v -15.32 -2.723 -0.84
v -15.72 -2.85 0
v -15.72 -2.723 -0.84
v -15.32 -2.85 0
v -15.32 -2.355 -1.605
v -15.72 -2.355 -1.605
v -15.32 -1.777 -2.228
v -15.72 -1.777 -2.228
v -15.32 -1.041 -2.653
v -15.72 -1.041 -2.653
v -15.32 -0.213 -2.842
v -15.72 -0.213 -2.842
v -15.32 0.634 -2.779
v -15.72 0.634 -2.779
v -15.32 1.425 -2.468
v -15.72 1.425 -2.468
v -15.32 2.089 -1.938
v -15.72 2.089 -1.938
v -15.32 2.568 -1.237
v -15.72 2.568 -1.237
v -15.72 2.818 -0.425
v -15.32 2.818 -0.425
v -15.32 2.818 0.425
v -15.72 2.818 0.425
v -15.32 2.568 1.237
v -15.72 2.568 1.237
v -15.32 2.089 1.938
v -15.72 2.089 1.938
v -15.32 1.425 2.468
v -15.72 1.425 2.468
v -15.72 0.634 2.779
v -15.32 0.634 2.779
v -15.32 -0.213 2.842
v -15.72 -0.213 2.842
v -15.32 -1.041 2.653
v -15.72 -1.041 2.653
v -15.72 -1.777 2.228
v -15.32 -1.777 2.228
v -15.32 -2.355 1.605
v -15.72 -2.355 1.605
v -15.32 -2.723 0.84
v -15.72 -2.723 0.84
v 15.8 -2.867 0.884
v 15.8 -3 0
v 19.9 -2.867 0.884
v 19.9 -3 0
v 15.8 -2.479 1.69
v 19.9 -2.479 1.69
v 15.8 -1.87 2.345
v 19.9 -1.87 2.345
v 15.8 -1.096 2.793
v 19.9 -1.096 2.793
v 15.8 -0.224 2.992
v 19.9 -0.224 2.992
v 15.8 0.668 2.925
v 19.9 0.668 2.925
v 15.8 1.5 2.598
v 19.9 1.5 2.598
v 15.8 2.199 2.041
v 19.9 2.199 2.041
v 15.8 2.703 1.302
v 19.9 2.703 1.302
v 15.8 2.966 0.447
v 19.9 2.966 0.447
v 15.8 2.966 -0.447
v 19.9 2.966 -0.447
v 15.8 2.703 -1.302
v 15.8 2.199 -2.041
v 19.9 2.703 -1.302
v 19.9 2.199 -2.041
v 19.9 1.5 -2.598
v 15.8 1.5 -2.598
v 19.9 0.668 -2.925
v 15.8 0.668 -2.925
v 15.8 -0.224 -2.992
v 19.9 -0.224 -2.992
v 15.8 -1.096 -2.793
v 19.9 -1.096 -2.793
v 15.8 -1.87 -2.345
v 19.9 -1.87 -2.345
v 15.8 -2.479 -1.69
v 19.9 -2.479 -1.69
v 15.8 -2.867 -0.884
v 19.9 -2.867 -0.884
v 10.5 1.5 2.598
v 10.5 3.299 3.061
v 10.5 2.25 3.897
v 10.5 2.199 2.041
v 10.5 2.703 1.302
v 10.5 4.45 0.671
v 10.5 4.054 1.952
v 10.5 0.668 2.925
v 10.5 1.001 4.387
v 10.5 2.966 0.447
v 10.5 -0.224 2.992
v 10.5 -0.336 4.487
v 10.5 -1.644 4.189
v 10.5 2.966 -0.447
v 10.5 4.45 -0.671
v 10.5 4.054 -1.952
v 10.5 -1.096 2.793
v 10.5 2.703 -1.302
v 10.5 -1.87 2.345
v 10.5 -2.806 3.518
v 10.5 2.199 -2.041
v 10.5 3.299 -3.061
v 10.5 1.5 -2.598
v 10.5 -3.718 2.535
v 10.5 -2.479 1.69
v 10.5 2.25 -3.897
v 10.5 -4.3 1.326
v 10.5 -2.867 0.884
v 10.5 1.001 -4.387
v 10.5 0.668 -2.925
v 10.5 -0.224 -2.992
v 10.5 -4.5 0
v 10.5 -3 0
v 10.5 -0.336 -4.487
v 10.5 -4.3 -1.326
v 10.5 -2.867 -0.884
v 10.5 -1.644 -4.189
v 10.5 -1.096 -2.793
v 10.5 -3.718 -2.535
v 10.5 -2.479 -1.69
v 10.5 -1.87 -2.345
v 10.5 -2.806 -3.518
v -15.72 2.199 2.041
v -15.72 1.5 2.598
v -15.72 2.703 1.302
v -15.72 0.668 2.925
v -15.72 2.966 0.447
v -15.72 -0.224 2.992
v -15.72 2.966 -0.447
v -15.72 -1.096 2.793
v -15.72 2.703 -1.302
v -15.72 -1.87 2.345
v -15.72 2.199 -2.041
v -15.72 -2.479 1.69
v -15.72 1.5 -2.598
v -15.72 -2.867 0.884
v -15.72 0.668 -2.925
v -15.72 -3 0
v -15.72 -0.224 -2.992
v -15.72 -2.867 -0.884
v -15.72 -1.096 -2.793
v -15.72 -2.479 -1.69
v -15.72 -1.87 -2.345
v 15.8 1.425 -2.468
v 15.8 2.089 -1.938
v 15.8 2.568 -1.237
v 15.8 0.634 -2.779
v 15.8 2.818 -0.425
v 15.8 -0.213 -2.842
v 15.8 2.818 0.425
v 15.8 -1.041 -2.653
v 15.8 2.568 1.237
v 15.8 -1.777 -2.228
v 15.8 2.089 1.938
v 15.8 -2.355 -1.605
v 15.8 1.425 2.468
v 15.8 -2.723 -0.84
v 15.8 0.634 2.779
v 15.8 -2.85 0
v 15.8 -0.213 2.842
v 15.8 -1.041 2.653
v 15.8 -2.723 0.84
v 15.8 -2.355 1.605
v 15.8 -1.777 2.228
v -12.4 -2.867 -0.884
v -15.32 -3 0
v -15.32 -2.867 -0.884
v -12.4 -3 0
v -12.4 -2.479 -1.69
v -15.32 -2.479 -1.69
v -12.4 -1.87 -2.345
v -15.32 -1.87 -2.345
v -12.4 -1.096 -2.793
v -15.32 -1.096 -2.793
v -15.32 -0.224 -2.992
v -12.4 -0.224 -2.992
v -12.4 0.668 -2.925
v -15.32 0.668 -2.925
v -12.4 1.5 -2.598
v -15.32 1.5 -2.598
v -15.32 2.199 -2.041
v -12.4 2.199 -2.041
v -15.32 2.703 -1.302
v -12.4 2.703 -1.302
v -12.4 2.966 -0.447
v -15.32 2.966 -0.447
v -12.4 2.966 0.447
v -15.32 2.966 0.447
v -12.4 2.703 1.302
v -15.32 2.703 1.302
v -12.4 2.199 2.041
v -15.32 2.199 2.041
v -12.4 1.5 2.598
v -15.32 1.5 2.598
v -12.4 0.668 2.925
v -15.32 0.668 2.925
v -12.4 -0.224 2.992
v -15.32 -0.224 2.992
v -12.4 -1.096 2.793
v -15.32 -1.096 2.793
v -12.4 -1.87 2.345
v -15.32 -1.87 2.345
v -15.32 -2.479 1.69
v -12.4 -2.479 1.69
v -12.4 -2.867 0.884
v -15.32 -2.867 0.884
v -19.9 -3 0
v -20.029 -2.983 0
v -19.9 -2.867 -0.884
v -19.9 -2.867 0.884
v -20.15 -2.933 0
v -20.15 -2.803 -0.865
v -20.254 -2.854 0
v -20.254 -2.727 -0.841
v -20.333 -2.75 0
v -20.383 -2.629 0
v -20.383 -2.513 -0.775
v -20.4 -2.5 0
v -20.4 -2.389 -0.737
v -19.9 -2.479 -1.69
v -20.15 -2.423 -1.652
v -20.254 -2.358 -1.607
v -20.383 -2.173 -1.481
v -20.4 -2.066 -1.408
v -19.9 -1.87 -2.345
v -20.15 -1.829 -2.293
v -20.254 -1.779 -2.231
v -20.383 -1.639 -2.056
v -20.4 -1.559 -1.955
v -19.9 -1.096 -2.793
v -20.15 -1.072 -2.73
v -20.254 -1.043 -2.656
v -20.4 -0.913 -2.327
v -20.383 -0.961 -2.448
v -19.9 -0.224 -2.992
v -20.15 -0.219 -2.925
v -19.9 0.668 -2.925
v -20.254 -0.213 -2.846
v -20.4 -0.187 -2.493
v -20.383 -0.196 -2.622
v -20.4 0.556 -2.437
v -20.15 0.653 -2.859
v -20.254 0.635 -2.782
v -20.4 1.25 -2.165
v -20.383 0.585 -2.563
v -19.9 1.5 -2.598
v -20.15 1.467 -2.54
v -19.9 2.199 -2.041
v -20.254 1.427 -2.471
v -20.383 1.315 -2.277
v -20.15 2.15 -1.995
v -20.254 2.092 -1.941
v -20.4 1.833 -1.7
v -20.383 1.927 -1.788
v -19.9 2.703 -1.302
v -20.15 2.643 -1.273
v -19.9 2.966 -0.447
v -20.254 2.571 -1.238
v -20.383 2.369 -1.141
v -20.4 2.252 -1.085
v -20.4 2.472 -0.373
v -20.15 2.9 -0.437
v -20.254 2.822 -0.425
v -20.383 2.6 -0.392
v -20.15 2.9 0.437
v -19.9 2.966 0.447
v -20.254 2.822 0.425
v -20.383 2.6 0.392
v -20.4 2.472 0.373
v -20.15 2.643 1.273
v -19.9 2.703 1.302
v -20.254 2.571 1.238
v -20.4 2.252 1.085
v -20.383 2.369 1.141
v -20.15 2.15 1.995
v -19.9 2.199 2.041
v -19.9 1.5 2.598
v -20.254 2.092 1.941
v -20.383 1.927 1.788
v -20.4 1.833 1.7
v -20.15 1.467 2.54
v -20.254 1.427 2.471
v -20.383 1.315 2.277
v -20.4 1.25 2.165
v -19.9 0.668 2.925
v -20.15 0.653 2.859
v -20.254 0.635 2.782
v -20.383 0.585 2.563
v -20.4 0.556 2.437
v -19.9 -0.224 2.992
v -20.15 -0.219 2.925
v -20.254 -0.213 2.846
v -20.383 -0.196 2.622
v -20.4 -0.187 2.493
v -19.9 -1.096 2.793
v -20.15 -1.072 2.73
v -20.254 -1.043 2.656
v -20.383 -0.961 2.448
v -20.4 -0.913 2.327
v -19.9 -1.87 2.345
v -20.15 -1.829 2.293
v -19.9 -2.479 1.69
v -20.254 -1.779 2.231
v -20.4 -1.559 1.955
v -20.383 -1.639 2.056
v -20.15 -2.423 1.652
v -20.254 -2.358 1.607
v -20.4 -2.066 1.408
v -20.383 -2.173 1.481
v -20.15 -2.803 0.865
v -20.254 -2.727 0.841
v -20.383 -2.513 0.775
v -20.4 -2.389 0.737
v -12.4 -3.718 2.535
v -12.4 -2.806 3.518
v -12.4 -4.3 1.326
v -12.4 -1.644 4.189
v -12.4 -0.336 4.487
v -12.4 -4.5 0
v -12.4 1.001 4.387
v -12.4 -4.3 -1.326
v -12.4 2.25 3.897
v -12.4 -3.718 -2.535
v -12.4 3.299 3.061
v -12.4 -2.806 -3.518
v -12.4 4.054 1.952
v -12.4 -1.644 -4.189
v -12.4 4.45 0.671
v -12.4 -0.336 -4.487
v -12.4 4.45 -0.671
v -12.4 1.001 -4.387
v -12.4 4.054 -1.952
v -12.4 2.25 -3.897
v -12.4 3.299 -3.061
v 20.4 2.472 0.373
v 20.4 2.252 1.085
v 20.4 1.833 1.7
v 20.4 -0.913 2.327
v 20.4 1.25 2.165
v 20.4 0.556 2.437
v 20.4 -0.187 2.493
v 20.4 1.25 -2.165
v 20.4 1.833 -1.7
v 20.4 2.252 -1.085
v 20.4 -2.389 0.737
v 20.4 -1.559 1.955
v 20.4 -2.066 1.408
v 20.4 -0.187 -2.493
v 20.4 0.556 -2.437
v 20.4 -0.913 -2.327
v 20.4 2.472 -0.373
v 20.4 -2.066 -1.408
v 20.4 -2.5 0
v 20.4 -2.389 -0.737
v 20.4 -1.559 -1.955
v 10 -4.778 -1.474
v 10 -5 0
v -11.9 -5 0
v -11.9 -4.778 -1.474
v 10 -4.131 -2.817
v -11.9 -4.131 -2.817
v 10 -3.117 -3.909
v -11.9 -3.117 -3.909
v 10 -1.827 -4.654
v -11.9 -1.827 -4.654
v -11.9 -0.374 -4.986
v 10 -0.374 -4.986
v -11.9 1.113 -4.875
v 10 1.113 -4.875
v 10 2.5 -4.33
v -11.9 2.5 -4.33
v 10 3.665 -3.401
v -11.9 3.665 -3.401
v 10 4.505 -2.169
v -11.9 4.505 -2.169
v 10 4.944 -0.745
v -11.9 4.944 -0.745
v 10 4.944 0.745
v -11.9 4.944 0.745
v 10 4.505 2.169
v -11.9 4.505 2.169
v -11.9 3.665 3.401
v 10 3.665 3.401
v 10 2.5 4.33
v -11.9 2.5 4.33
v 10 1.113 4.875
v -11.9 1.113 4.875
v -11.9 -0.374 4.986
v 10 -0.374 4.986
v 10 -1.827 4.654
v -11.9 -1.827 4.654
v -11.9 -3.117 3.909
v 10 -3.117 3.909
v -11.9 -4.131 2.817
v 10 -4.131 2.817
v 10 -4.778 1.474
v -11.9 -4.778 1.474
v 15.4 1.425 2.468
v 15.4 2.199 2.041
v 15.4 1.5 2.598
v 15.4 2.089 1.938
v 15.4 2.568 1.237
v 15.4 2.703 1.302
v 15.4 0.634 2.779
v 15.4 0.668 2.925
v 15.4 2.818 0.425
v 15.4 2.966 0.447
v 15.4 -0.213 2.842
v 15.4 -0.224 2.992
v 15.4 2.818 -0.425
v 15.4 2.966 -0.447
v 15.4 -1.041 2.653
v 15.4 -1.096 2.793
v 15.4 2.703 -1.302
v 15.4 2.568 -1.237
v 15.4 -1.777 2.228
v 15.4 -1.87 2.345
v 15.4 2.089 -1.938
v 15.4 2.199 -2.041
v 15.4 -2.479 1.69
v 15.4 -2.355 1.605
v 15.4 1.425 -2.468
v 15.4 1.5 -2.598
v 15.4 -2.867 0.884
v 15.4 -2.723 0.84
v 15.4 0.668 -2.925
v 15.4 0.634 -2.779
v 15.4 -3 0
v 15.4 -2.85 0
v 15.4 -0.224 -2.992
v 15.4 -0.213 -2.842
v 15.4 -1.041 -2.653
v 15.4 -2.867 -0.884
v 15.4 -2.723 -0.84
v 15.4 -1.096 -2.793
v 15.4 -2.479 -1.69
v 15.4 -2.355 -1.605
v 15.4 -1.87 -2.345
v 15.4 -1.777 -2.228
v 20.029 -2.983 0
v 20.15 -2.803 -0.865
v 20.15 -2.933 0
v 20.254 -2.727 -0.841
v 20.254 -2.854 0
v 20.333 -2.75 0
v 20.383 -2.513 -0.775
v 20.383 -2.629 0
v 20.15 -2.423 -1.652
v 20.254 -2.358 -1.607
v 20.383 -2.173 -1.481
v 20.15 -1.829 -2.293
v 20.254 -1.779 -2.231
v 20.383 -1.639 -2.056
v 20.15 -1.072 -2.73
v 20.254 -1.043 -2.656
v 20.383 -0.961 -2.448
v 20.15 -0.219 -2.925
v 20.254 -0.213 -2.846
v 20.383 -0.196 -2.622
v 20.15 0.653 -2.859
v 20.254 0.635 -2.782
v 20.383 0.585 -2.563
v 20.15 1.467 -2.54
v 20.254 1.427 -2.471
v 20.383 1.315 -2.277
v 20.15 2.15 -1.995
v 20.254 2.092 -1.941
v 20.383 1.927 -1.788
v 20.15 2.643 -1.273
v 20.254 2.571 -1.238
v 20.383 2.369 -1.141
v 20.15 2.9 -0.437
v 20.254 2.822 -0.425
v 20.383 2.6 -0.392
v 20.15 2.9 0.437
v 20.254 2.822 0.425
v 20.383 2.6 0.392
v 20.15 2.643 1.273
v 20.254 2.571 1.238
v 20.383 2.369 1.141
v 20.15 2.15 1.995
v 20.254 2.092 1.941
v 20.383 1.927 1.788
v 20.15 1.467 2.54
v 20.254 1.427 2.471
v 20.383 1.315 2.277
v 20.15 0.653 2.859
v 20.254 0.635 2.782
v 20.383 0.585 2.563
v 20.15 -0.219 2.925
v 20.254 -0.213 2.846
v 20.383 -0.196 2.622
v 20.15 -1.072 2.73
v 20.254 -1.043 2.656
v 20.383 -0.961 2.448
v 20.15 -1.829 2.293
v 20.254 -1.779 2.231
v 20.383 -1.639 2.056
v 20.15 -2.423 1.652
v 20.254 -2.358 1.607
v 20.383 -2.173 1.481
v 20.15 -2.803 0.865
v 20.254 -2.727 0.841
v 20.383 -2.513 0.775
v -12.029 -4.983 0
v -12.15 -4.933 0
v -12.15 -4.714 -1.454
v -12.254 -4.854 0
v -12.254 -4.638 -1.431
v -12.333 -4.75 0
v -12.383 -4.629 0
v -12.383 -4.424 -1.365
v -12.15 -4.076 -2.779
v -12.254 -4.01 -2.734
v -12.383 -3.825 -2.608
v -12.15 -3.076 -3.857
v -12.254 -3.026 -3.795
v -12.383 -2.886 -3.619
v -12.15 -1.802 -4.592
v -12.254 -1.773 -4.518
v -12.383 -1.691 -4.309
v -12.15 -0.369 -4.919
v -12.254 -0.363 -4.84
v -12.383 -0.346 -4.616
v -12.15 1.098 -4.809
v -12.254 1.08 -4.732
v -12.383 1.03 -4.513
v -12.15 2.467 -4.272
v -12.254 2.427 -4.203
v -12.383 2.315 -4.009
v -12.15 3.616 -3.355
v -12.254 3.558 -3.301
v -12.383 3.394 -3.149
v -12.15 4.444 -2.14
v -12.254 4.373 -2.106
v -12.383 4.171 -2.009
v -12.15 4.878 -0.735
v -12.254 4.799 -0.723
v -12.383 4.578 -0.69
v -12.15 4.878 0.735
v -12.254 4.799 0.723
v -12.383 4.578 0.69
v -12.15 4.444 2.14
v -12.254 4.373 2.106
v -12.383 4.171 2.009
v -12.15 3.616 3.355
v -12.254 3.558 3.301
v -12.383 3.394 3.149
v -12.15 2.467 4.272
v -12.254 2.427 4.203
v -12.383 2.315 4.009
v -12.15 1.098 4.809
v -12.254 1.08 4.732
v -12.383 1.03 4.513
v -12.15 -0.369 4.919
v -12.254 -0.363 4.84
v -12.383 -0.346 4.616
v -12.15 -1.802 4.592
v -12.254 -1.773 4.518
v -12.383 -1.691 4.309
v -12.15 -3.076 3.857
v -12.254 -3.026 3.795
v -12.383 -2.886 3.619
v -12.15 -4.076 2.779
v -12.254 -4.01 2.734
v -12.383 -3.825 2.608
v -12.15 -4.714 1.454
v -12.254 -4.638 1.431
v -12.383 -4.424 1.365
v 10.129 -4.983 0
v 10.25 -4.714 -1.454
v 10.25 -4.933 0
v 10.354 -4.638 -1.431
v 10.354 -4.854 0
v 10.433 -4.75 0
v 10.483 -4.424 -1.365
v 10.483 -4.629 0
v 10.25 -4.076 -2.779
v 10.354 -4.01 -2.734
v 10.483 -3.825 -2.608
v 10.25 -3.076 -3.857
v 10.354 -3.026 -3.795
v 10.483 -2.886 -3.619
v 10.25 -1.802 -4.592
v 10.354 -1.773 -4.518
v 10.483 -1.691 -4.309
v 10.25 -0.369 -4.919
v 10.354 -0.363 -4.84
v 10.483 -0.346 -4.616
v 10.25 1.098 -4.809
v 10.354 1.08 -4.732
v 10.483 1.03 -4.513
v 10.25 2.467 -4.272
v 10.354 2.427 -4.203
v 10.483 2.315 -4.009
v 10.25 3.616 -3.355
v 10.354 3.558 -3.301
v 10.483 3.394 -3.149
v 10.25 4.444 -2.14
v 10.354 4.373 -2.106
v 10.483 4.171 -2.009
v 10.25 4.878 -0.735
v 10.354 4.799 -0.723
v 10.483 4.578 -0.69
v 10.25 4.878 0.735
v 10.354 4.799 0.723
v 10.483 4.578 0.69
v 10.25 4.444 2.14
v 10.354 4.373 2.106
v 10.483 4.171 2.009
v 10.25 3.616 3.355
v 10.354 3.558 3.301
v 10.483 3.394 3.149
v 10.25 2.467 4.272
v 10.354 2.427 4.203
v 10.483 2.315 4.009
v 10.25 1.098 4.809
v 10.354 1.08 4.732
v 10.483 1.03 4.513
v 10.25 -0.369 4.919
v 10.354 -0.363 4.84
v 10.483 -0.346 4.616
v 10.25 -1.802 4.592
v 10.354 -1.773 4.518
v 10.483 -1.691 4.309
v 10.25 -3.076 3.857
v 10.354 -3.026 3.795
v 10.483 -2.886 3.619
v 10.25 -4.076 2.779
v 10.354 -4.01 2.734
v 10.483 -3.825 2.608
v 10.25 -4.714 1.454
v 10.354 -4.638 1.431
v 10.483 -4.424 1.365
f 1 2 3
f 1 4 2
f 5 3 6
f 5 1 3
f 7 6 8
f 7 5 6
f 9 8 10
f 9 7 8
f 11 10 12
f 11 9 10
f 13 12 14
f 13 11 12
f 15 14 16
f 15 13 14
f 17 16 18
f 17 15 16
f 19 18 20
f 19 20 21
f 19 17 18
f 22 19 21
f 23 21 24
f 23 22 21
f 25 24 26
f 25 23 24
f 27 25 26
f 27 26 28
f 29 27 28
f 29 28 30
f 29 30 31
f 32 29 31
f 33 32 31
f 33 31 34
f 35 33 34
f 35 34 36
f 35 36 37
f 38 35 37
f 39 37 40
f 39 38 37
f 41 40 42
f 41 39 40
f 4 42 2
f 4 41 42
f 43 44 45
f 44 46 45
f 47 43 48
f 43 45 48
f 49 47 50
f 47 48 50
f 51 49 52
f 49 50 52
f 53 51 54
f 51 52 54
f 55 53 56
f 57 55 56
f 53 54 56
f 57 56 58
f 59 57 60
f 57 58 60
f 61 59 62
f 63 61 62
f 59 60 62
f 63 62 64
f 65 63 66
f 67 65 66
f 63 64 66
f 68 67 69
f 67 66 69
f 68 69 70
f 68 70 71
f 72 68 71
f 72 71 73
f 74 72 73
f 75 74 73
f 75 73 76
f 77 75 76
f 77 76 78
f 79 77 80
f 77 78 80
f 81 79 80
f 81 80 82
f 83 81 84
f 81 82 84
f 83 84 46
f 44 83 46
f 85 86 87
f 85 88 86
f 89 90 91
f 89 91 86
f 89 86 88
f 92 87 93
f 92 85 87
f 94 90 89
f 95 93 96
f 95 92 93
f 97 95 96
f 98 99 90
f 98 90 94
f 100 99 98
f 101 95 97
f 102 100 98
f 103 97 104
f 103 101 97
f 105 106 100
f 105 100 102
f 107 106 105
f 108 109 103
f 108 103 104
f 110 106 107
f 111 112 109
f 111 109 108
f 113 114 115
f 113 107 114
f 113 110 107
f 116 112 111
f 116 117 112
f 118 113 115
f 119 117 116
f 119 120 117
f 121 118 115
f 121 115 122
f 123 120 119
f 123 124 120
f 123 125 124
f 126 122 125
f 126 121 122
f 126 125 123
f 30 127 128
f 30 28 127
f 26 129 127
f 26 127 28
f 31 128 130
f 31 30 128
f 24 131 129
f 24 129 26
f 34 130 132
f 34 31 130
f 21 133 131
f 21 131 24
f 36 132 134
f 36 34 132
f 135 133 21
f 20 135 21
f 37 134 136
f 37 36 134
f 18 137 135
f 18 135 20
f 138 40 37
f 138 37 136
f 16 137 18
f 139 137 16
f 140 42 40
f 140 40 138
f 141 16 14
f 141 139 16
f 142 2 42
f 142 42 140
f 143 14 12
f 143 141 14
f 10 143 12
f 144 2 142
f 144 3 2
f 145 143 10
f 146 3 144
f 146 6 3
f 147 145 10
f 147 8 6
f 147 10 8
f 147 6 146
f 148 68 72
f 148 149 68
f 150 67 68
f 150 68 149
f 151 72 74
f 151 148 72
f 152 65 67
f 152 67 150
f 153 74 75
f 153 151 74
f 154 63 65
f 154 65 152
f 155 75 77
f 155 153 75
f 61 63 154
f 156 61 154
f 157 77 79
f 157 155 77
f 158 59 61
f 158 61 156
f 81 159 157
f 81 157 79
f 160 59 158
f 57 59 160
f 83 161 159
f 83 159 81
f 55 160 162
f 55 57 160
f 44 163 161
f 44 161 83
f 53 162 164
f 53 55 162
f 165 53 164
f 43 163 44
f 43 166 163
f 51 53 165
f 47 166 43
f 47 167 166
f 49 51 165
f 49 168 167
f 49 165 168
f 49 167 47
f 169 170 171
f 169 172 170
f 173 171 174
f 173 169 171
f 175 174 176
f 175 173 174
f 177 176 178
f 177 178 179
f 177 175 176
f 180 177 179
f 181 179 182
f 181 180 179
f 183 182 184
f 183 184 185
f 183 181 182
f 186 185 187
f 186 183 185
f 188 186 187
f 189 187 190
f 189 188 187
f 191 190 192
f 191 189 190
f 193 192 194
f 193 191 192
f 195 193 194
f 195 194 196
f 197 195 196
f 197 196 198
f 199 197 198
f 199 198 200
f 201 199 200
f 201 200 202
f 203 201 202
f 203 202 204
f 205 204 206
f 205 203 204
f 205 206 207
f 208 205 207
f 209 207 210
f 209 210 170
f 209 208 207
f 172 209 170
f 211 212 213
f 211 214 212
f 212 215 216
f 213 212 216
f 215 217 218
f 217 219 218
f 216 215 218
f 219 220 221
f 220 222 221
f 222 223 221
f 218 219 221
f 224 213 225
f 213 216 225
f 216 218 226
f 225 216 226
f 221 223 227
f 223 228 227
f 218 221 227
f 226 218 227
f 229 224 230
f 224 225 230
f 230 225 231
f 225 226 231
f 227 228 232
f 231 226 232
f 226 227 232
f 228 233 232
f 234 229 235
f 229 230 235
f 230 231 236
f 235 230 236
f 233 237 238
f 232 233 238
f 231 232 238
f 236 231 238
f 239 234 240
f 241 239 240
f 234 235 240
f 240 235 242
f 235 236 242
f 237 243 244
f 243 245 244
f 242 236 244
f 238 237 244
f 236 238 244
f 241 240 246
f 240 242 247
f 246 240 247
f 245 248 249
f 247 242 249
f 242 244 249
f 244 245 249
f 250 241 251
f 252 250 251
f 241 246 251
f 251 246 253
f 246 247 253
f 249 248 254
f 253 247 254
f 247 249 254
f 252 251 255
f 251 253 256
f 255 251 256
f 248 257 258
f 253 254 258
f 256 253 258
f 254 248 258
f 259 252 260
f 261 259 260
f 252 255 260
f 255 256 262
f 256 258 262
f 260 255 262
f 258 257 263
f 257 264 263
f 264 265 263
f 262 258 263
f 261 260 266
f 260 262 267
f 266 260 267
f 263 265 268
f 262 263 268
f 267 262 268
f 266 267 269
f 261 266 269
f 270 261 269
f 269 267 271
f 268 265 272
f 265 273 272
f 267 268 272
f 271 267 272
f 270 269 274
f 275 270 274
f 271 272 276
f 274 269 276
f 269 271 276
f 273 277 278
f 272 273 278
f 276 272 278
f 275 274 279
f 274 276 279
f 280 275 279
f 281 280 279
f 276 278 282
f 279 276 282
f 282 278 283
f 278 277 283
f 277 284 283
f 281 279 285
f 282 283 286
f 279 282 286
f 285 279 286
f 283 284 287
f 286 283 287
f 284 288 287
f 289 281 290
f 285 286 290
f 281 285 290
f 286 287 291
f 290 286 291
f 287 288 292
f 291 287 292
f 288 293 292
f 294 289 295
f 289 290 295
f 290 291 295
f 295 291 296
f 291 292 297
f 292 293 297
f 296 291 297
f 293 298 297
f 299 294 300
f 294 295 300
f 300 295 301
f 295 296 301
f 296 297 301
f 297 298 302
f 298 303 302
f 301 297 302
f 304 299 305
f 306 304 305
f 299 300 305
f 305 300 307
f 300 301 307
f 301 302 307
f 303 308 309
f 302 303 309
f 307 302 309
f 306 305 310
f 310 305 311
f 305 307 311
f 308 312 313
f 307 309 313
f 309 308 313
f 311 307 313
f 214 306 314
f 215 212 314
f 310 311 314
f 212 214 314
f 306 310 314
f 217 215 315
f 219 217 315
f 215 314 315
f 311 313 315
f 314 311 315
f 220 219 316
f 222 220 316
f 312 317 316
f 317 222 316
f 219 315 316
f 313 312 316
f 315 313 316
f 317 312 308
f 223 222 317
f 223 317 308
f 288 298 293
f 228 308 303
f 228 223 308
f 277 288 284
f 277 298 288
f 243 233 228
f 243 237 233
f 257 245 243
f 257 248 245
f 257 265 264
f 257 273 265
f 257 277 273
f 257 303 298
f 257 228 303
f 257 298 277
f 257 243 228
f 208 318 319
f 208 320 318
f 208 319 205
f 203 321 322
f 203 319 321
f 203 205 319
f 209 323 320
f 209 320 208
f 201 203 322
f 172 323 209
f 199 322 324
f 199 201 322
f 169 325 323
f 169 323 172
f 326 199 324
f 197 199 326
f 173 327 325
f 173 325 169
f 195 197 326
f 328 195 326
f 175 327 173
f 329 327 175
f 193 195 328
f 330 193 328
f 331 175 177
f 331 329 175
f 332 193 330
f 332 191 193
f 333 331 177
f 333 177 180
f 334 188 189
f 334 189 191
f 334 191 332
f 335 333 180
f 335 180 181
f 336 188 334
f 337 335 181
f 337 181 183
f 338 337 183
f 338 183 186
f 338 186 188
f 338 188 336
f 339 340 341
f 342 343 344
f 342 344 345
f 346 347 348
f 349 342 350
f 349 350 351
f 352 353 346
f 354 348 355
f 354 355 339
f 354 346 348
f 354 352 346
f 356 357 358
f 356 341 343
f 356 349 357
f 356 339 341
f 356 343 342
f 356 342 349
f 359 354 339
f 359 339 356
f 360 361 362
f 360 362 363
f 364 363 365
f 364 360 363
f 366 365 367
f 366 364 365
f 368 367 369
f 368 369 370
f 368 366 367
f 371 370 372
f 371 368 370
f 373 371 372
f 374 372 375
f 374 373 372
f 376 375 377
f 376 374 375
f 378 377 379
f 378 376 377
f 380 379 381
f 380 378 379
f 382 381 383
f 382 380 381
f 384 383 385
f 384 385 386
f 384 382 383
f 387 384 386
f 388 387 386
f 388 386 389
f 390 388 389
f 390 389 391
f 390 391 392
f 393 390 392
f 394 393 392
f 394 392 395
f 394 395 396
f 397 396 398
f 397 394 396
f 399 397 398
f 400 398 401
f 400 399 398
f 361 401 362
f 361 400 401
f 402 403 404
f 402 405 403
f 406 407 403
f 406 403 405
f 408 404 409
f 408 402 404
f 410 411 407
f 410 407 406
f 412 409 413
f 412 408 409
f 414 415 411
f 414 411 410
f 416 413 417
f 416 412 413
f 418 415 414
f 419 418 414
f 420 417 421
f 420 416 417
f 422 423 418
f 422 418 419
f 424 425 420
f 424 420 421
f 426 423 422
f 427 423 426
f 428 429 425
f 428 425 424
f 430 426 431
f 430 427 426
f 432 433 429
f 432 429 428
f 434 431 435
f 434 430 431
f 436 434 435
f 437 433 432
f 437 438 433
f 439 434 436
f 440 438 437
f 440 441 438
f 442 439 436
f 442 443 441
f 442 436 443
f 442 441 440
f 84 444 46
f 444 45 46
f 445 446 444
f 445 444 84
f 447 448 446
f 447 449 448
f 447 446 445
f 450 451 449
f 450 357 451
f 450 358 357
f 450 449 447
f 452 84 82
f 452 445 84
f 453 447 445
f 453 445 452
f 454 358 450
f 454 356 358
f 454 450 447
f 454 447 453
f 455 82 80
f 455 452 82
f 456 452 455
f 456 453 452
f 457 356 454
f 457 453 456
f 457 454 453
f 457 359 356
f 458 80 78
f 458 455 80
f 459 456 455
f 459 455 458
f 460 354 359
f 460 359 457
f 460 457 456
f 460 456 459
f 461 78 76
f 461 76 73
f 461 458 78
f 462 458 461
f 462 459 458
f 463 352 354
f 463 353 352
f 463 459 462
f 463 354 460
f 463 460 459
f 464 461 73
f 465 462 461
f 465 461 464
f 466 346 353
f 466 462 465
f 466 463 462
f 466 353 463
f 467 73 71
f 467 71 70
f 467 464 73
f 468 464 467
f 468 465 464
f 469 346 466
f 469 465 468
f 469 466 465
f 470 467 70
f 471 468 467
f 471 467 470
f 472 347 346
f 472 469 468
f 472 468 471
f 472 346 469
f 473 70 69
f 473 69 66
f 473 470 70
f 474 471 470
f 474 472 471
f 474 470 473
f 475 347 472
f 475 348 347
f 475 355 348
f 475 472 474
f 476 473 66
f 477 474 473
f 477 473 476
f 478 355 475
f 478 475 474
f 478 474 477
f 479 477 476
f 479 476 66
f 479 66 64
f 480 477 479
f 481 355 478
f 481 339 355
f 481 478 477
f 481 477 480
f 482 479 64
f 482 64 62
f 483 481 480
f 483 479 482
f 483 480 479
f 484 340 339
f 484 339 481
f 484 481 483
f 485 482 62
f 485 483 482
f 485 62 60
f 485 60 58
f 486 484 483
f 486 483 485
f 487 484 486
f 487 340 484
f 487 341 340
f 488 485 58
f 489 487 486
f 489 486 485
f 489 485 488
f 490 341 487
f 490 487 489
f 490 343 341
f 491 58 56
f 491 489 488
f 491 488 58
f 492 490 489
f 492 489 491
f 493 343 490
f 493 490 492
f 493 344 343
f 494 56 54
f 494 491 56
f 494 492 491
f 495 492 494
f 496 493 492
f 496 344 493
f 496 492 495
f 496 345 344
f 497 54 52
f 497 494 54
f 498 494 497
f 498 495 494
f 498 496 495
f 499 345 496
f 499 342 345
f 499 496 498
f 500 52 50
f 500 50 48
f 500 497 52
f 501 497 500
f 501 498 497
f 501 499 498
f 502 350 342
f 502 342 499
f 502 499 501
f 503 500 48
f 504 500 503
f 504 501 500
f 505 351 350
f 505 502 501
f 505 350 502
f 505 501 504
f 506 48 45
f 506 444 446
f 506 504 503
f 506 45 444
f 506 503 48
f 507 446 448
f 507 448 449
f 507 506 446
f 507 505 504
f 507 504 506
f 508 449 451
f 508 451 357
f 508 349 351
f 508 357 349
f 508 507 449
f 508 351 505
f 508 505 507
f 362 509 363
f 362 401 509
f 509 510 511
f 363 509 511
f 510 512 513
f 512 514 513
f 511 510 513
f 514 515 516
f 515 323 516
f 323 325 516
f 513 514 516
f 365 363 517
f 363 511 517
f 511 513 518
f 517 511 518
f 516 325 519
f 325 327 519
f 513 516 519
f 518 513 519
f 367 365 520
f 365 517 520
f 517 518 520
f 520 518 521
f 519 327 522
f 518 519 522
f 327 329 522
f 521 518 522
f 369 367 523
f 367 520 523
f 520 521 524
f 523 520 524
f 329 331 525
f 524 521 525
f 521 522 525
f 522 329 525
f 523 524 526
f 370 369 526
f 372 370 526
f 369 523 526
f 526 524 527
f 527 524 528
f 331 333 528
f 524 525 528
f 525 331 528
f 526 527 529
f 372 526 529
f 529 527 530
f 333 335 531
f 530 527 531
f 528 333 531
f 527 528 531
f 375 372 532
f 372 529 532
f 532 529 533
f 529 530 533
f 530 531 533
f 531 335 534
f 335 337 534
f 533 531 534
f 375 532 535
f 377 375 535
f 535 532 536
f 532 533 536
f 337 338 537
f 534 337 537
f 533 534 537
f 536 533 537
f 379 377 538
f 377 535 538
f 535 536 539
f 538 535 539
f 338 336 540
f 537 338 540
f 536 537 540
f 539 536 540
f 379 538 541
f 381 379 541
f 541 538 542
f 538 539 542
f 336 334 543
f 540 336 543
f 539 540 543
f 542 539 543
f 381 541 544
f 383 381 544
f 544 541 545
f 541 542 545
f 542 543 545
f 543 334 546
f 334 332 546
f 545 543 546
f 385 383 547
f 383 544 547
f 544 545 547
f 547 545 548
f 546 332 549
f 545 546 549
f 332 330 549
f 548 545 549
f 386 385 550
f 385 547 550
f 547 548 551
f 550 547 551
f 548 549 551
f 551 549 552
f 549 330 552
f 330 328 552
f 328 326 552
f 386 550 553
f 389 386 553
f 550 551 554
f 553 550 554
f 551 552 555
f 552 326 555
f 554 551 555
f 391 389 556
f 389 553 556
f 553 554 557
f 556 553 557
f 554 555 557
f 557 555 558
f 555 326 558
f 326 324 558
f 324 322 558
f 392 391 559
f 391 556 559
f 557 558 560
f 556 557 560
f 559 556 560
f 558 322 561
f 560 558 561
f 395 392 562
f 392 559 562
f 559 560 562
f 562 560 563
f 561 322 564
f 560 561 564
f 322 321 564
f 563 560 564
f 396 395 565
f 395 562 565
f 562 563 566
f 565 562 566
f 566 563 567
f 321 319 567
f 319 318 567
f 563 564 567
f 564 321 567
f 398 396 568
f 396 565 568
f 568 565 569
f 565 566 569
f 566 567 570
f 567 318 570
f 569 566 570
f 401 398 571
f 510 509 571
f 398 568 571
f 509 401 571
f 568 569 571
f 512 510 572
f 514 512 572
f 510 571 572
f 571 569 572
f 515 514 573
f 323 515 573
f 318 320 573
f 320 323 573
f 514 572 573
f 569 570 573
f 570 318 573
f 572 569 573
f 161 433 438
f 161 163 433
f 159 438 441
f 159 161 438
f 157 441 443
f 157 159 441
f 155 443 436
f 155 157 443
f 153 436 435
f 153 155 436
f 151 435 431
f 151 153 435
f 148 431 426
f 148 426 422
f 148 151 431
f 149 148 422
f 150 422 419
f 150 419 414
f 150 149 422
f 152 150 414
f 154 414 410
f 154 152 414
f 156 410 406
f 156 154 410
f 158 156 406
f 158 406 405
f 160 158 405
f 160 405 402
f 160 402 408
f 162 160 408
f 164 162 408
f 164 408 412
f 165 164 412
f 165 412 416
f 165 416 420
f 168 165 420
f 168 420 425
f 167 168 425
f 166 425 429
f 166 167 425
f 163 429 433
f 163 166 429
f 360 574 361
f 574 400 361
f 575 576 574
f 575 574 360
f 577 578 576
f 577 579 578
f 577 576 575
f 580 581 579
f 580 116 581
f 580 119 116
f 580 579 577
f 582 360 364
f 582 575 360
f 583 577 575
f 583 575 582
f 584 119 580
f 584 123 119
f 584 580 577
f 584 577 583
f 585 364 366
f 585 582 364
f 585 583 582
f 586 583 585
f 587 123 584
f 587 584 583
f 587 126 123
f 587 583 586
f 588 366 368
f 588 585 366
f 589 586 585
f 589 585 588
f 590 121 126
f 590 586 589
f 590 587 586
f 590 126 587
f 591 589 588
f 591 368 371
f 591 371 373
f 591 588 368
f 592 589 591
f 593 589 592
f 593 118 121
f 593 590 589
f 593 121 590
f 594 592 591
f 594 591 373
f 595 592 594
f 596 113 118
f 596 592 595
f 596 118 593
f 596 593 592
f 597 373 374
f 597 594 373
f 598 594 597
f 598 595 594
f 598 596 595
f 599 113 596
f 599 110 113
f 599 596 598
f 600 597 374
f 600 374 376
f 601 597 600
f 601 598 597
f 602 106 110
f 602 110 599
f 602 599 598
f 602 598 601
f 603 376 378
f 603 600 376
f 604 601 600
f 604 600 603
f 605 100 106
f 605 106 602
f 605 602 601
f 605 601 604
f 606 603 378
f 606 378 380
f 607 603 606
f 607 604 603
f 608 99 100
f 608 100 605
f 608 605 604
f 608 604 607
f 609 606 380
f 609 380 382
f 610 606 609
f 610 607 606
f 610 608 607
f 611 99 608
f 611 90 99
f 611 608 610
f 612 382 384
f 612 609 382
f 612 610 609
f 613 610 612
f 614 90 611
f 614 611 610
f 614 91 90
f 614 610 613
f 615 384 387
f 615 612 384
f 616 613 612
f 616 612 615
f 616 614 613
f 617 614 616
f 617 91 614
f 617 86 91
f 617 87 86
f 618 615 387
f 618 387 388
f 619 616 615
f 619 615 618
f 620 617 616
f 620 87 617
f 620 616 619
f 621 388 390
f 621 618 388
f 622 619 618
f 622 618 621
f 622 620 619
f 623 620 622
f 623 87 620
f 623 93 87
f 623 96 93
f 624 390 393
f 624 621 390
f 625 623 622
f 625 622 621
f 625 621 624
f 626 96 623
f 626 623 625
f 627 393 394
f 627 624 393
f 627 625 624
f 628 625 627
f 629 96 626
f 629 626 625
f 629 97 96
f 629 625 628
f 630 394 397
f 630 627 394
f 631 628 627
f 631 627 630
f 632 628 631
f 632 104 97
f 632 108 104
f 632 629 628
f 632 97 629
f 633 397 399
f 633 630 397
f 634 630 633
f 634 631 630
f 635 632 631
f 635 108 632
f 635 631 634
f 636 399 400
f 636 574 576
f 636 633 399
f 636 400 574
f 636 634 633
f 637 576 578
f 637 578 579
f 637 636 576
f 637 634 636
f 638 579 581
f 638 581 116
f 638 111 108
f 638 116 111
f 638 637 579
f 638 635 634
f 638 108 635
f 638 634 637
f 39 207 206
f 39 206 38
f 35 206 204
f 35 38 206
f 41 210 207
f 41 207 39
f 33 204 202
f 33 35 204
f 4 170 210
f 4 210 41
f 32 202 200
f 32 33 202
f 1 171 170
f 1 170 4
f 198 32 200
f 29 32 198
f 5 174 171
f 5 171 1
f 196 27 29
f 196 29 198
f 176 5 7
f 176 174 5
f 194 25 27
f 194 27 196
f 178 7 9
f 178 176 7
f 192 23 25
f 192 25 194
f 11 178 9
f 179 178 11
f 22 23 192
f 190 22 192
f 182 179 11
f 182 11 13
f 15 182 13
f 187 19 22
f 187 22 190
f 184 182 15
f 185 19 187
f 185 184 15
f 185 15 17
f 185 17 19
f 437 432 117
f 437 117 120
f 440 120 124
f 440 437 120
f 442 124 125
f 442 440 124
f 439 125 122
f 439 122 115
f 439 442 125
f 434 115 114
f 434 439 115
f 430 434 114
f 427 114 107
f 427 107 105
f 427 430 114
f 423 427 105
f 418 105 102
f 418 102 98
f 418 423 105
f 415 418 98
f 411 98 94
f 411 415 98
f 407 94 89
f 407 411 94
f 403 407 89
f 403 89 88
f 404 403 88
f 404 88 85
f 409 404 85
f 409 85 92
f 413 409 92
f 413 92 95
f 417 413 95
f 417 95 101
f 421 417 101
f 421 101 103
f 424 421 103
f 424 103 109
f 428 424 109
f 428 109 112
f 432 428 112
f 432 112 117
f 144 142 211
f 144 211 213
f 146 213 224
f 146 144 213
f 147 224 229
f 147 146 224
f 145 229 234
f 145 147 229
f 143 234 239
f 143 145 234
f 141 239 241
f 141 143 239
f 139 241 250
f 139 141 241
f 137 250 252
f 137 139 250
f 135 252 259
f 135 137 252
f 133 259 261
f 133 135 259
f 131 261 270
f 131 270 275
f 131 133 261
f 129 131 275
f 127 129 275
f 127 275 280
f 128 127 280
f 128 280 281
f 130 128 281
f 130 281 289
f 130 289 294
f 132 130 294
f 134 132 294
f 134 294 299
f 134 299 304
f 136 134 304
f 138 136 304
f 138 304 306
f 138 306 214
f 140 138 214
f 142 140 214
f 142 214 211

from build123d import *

# Parameters (mm, degrees)
SKETCH2_R           = 5
SKETCH2_R_2         = 3
CUT_EXTRUDE2_DEPTH  = 1.9
FILLET1_R           = 0.5
BOSS_EXTRUDE2_START = 0.1
SKETCH4_R           = 3
SKETCH4_R_2         = 2.85
BOSS_EXTRUDE2_DEPTH = 0.1
SKETCH6_R           = 3
SKETCH6_R_2         = 2.85
BOSS_EXTRUDE3_DEPTH = 0.02
BOSS_EXTRUDE4_START = 0.08
SKETCH7_R           = 3
SKETCH7_R_2         = 2.85
BOSS_EXTRUDE4_DEPTH = 0.08


with BuildPart() as part:
    # Sketch1 → Revolve1 (revolve)
    with BuildSketch(Plane.XY, mode=Mode.PRIVATE) as revolve1_sk:
        Polygon((-12.4, 5), (12.4, 5), (12.4, 3), (15.32, 3), (15.32, 2.85), (15.82, 2.85), (15.82, 3), (20.4, 3), (20.4, 0), (-20.4, 0), (-20.4, 3), (-15.82, 3), (-15.82, 2.85), (-15.32, 2.85), (-15.32, 3), (-12.4, 3), align=None)
    revolve(revolve1_sk.sketch.rotate(Axis((-20.4, 0, 0), (1, 0, 0)), 180), axis=Axis((-20.4, 0, 0), (1, 0, 0)))

    # Sketch2 → Cut-Extrude2 (cut)
    with BuildSketch(Plane(origin=(12.4, 0, 0), x_dir=(0, 0, -1), z_dir=(1, 0, 0))):
        with Locations(Location((0, 0, 0), (0, 0, 270))):
            Circle(SKETCH2_R)
        with Locations(Location((0, 0, 0), (0, 0, 270))):
            Circle(SKETCH2_R_2, mode=Mode.SUBTRACT)
    extrude(amount=-CUT_EXTRUDE2_DEPTH, mode=Mode.SUBTRACT)

    # Fillet1
    fillet1_edges = [part.edges().sort_by_distance(p)[0] for p in [
        (20.4, 3, 0),
        (-20.4, 3, 0),
        (-12.4, 5, 0),
        (10.5, 5, 0),
    ]]
    fillet(fillet1_edges, radius=FILLET1_R)

    # Sketch4 → Boss-Extrude2 (add)
    with BuildSketch(Plane(origin=(-15.82, 0, 0), x_dir=(0, 0, -1), z_dir=(1, 0, 0)).offset(BOSS_EXTRUDE2_START)):
        with Locations(Location((0, 0, 0), (0, 0, 270))):
            Circle(SKETCH4_R)
        with Locations(Location((0, 0, 0), (0, 0, 270))):
            Circle(SKETCH4_R_2, mode=Mode.SUBTRACT)
    extrude(amount=-BOSS_EXTRUDE2_DEPTH)

    # Sketch6 → Boss-Extrude3 (add)
    with BuildSketch(Plane.ZY.offset(-15.82)):
        with Locations(Location((0, 0, 0), (0, 0, 270))):
            Circle(SKETCH6_R)
        with Locations(Location((0, 0, 0), (0, 0, 270))):
            Circle(SKETCH6_R_2, mode=Mode.SUBTRACT)
    extrude(amount=BOSS_EXTRUDE3_DEPTH)

    # Sketch7 → Boss-Extrude4 (add)
    with BuildSketch(Plane(origin=(15.32, 0, 0), x_dir=(0, 0, -1), z_dir=(1, 0, 0)).offset(BOSS_EXTRUDE4_START)):
        with Locations(Location((0, 0, 0), (0, 0, 270))):
            Circle(SKETCH7_R)
        with Locations(Location((0, 0, 0), (0, 0, 270))):
            Circle(SKETCH7_R_2, mode=Mode.SUBTRACT)
    extrude(amount=-BOSS_EXTRUDE4_DEPTH)


solid = part.part
